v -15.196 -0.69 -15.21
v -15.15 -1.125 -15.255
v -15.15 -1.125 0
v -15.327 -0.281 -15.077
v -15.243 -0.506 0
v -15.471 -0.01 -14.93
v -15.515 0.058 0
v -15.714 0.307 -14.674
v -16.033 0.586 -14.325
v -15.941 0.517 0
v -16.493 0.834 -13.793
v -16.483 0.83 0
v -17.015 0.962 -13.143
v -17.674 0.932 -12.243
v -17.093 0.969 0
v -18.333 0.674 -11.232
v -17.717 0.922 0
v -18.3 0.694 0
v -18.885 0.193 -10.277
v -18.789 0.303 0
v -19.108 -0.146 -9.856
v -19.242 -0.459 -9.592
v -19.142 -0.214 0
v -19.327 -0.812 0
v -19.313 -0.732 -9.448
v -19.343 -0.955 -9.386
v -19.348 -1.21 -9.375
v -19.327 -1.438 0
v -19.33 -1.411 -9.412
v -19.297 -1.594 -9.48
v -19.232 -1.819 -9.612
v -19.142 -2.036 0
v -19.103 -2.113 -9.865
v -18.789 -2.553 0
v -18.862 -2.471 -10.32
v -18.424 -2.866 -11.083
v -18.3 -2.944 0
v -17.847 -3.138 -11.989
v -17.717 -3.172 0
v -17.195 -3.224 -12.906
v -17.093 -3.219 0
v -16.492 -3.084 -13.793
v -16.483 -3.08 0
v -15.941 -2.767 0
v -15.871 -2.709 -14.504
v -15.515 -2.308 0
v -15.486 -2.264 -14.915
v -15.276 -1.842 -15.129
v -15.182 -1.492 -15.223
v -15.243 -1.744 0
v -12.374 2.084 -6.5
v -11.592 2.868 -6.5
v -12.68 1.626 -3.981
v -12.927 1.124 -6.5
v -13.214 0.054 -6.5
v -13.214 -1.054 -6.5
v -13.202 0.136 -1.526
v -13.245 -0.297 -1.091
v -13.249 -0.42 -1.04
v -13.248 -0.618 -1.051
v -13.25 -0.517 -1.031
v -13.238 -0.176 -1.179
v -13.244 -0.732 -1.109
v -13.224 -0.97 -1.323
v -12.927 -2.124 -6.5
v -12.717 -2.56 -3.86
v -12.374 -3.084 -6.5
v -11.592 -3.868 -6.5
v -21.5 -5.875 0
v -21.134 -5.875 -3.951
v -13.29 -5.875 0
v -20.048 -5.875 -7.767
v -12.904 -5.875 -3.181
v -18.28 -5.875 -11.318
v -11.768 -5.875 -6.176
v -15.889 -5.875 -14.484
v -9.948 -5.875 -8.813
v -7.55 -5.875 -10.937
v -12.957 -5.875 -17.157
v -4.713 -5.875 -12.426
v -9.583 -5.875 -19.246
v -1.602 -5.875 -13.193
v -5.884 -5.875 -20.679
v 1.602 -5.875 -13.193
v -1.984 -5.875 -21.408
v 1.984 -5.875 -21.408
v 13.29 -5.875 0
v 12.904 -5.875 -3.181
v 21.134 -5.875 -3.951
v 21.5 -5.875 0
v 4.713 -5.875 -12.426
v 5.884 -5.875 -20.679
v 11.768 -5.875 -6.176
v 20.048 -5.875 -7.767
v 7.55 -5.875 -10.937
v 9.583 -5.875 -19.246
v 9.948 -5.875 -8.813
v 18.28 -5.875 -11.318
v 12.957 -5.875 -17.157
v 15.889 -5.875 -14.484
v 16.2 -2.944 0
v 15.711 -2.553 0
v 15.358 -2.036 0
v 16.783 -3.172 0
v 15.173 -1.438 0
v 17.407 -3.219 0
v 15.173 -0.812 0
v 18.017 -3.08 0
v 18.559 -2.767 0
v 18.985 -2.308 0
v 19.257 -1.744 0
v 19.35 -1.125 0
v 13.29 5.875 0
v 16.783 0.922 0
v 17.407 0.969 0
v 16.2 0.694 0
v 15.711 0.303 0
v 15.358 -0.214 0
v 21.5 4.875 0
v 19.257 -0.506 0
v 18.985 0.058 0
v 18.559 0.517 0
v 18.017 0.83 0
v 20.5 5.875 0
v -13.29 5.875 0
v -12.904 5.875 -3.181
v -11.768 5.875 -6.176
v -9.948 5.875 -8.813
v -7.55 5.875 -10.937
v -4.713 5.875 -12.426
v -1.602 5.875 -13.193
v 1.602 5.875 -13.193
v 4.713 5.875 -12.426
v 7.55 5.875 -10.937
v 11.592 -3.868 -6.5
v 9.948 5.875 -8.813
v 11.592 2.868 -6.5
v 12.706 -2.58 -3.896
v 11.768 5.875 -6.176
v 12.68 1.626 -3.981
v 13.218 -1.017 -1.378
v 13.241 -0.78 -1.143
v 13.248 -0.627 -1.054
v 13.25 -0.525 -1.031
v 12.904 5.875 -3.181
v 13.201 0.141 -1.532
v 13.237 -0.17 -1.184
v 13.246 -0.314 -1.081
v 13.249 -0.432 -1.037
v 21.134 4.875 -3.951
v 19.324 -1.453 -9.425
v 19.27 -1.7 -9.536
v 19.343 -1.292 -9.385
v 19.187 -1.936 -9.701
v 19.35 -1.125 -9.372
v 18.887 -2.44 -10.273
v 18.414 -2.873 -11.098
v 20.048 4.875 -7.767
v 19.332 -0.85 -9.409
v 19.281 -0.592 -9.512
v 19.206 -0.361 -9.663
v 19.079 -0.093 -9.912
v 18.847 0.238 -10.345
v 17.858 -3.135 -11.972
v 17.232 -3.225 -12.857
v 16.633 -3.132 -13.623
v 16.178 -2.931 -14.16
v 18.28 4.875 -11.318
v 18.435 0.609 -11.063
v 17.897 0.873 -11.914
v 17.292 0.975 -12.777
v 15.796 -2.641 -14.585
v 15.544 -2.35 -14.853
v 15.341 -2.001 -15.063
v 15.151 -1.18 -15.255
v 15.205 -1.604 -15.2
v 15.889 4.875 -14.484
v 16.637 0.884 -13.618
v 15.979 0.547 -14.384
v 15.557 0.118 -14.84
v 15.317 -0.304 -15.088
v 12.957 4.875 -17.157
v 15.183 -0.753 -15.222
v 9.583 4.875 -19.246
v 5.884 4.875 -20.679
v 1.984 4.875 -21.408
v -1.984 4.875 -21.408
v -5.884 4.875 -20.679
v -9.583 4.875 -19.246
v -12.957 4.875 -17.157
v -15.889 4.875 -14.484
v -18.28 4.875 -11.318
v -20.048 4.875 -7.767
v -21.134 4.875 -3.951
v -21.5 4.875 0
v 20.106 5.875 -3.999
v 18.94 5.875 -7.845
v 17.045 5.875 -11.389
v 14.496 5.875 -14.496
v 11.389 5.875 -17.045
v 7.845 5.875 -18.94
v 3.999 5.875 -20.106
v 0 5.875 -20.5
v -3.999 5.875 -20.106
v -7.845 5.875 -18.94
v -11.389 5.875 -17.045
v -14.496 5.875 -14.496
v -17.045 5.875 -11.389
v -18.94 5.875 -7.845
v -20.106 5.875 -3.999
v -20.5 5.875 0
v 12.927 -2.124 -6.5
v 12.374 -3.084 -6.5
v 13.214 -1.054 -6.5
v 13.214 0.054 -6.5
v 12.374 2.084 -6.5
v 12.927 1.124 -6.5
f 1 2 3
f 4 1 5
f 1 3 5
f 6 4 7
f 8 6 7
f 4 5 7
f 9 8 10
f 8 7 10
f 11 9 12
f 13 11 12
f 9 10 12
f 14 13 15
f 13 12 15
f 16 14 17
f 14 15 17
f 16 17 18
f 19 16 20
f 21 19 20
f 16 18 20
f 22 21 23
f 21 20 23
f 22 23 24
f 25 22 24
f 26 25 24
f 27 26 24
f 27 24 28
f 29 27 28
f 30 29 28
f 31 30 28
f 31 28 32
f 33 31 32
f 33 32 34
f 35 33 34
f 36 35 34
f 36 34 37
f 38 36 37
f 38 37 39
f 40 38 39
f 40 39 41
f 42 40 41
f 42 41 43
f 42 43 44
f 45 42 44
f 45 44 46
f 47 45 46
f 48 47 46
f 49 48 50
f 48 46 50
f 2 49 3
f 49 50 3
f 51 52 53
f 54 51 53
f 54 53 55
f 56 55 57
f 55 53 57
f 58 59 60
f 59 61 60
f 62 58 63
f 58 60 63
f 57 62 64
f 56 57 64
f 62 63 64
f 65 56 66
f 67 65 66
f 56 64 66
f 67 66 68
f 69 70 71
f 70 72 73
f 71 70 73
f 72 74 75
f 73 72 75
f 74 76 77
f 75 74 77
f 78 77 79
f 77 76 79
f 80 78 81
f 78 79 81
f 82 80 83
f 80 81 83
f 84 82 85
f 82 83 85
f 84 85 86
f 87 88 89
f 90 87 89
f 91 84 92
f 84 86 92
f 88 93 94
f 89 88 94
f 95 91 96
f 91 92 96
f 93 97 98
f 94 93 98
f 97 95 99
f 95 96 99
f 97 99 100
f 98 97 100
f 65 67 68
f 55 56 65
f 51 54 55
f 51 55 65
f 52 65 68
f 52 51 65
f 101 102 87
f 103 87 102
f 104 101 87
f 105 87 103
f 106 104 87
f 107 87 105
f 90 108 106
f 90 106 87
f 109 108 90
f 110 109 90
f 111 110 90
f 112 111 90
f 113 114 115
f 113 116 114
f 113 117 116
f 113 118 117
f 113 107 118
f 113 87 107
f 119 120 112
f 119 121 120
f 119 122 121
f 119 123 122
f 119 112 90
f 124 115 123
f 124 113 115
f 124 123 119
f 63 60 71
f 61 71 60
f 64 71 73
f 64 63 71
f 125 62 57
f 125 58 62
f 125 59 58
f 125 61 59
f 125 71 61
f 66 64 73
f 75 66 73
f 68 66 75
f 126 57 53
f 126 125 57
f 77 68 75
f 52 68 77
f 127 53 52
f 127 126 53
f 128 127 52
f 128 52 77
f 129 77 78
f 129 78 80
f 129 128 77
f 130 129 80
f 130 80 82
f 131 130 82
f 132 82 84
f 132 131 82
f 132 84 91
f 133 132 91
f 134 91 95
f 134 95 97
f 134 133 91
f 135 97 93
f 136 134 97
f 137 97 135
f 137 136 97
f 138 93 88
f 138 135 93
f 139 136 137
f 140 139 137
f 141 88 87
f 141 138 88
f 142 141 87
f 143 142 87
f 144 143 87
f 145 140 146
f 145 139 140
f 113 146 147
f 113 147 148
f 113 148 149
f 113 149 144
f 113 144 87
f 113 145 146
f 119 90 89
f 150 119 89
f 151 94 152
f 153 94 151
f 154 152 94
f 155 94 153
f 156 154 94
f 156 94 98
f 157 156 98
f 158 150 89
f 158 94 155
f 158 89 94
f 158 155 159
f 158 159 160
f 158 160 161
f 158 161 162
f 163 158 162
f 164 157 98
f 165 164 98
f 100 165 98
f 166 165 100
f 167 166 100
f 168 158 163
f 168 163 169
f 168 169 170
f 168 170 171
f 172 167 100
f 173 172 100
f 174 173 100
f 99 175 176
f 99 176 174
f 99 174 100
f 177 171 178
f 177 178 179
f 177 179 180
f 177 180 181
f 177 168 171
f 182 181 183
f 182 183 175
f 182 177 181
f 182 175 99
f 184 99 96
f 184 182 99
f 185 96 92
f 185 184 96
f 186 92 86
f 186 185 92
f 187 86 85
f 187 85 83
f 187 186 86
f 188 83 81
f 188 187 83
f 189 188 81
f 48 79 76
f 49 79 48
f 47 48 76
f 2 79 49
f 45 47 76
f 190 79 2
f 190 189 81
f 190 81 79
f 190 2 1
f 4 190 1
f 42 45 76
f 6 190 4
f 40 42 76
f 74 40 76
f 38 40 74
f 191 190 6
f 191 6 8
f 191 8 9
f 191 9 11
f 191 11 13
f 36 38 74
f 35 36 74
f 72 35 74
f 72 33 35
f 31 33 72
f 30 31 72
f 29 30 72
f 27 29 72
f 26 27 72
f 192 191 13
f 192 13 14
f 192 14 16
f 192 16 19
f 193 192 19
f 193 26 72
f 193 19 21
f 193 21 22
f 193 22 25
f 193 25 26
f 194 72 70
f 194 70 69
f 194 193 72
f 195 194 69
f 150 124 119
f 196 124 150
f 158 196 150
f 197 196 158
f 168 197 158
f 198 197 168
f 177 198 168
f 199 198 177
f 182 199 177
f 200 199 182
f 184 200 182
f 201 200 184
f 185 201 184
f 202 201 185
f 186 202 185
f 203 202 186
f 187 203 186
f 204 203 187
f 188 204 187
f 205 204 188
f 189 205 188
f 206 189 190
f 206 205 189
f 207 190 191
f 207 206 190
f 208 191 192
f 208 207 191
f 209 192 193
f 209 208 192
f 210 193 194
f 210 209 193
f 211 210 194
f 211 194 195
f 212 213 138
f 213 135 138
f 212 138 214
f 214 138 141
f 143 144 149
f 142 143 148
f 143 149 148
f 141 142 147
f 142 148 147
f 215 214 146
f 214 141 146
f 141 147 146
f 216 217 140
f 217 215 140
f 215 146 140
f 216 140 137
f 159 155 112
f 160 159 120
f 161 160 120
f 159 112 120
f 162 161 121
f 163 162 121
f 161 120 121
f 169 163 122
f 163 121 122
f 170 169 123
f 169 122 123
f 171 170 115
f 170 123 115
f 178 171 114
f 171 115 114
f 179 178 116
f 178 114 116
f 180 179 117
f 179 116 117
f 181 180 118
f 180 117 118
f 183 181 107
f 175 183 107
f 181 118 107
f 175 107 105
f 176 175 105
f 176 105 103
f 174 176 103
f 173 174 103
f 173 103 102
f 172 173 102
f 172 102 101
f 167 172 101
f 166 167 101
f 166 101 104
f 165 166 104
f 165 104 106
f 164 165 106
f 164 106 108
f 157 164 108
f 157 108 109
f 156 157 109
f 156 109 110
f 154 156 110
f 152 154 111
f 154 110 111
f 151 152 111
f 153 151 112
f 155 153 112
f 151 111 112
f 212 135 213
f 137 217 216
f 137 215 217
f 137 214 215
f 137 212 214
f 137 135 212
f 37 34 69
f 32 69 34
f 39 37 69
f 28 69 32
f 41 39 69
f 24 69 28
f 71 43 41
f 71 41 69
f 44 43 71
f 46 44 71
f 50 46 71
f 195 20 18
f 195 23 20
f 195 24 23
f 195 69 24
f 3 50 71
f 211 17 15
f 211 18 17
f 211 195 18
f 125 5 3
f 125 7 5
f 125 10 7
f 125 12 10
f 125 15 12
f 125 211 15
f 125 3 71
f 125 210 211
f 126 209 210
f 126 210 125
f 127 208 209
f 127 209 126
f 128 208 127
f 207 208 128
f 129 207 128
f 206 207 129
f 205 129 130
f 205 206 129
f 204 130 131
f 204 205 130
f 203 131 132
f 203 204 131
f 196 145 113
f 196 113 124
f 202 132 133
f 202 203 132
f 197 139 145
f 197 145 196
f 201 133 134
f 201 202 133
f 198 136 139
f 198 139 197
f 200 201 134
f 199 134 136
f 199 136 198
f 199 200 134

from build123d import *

# Parameters (mm, degrees)
BOSS_EXTRUDE1_DEPTH = 5.875
CHAMFER1_SIZE       = 1
SKETCH2_R           = 2.1
CUT_EXTRUDE1_DEPTH  = 22.5
SKETCH3_R           = 4.25
CUT_EXTRUDE2_DEPTH  = 6.5


with BuildPart() as part:
    # Sketch1 → Boss-Extrude1 (new body, symmetric)
    with BuildSketch(Plane(origin=(0, 0, 0), x_dir=(1, 0, 0), z_dir=(0, 1, 0))):
        with BuildLine():
            Line((-21.5, 0), (-13.29, 0))
            ThreePointArc((-13.29, 0), (0, 13.29), (13.29, 0))
            Line((13.29, 0), (21.5, 0))
            ThreePointArc((21.5, 0), (0, 21.5), (-21.5, 0))
        make_face()
    extrude(amount=BOSS_EXTRUDE1_DEPTH, both=True)

    # Chamfer1
    chamfer1_edges = [part.edges().sort_by_distance(p)[0] for p in [
        (0, 5.875, -21.5),
    ]]
    chamfer(chamfer1_edges, length=CHAMFER1_SIZE)

    # Sketch2 → Cut-Extrude1 (cut, through all)
    with BuildSketch(Plane.XY):
        with Locations((-17.25, -1.125)):
            Circle(SKETCH2_R)
        with Locations((17.25, -1.125)):
            Circle(SKETCH2_R)
    extrude(amount=-CUT_EXTRUDE1_DEPTH, mode=Mode.SUBTRACT)

    # Sketch3 → Cut-Extrude2 (cut)
    with BuildSketch(Plane.XY):
        with Locations((-9, -0.5)):
            Circle(SKETCH3_R)
        with Locations((9, -0.5)):
            Circle(SKETCH3_R)
    extrude(amount=-CUT_EXTRUDE2_DEPTH, mode=Mode.SUBTRACT)


solid = part.part
